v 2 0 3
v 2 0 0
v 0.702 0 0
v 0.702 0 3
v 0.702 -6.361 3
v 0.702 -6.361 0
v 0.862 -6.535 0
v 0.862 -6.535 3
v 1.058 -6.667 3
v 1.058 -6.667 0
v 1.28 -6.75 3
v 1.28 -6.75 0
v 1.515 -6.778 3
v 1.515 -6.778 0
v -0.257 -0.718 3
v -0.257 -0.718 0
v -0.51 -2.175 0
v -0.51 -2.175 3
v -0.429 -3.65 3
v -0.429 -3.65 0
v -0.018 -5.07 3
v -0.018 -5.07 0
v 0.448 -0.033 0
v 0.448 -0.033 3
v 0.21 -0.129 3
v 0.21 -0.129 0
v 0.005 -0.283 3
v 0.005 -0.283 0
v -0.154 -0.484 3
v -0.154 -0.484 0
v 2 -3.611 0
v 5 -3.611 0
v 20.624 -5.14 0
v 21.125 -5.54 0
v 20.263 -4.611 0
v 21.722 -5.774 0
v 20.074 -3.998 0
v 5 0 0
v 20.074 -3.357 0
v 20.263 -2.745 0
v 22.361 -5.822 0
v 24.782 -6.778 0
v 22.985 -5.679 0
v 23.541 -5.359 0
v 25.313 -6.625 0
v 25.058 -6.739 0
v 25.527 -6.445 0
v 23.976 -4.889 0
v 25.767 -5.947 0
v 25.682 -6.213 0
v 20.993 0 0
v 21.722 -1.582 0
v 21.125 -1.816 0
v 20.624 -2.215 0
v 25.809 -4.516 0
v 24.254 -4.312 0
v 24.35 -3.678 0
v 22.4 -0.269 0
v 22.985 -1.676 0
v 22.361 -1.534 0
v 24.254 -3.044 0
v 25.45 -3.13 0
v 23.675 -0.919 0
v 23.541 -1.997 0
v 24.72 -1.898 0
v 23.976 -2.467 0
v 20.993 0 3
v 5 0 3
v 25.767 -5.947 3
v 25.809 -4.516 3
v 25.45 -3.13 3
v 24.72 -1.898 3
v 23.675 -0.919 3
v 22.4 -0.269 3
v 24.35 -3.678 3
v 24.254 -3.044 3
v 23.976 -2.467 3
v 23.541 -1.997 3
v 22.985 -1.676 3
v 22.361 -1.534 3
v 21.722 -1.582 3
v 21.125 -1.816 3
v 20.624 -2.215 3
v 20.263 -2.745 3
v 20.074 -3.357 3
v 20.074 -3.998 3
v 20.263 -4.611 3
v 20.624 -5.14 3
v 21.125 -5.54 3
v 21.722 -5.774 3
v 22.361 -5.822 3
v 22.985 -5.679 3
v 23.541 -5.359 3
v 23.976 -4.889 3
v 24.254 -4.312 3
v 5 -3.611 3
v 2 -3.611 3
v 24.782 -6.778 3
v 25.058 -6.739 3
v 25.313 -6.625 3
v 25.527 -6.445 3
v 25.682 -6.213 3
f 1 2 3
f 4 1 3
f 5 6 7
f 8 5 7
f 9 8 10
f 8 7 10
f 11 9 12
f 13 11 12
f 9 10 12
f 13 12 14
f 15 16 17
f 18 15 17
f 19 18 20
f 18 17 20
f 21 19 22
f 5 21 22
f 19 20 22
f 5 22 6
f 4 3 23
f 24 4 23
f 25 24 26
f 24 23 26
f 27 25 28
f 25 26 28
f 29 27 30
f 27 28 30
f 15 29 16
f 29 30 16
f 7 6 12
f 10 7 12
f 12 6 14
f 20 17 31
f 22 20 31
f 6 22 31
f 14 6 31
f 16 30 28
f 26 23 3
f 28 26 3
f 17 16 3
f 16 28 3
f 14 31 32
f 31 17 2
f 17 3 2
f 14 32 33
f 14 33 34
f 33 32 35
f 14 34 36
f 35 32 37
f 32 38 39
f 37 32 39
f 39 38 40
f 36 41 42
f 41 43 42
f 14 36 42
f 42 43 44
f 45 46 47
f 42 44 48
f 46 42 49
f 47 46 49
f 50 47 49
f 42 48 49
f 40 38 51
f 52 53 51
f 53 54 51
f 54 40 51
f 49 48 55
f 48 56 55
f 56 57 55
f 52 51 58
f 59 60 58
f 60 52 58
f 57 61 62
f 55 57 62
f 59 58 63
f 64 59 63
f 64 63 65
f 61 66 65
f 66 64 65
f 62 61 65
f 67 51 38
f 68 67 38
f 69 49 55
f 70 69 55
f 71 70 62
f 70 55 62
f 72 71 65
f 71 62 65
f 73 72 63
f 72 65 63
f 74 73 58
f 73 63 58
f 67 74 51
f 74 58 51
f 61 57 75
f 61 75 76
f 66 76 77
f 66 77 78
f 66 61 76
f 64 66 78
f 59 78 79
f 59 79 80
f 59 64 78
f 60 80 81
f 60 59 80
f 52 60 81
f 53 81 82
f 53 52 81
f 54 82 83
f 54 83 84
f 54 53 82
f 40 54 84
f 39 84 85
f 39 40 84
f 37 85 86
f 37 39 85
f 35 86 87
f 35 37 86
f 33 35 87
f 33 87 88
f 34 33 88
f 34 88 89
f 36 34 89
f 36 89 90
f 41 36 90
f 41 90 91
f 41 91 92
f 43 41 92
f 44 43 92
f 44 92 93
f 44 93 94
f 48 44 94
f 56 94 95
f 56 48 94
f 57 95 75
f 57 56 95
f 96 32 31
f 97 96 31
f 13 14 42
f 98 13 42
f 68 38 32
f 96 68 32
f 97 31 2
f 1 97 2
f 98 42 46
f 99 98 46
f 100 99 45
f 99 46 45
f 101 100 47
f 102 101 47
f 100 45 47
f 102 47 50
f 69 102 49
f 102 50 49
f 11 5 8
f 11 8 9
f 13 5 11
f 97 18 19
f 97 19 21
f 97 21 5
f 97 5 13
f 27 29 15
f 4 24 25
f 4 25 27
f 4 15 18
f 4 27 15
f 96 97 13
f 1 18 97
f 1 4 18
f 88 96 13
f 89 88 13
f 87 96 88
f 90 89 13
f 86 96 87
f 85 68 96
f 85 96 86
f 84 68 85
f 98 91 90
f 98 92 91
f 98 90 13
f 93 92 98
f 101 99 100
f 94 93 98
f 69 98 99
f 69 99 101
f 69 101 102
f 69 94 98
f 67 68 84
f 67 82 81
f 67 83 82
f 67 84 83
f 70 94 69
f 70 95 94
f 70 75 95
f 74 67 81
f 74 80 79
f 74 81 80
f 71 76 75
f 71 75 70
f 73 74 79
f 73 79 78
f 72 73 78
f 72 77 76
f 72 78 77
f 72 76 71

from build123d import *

# Parameters (mm, degrees)
SKETCH2_R           = 2.15
BOSS_EXTRUDE1_DEPTH = 3


with BuildPart() as part:
    # Sketch2 → Boss-Extrude1 (new body)
    with BuildSketch(Plane.XY):
        with BuildLine():
            Line((20.505045688, 0), (5, 0))
            Line((5, 0), (5, -3.611111111))
            Line((5, -3.611111111), (2, -3.611111111))
            Line((2, -3.611111111), (2, 0))
            Line((2, 0), (0.702116043, 0))
            ThreePointArc((0.702116043, 0), (0.102828022, -0.199466511), (-0.257384219, -0.718292266))
            ThreePointArc((-0.257384219, -0.718292266), (-0.42929832, -3.650374688), (0.70215346, -6.36081352))
            ThreePointArc((0.70215346, -6.36081352), (1.058001533, -6.667450679), (1.514599965, -6.777777778))
            Line((1.514599965, -6.777777778), (22.805555556, -6.777777778))
            Line((22.805555556, -6.777777778), (24.781577826, -6.777777778))
            ThreePointArc((24.781577826, -6.777777778), (25.426089078, -6.542372603), (25.767157761, -5.94698827))
            ThreePointArc((25.767157761, -5.94698827), (24.71964165, -1.898378941), (20.993425754, 0))
            Line((20.993425754, 0), (20.505045688, 0))
        make_face()
        with Locations((22.2, -3.677777778)):
            Circle(SKETCH2_R, mode=Mode.SUBTRACT)
    extrude(amount=BOSS_EXTRUDE1_DEPTH)


solid = part.part
